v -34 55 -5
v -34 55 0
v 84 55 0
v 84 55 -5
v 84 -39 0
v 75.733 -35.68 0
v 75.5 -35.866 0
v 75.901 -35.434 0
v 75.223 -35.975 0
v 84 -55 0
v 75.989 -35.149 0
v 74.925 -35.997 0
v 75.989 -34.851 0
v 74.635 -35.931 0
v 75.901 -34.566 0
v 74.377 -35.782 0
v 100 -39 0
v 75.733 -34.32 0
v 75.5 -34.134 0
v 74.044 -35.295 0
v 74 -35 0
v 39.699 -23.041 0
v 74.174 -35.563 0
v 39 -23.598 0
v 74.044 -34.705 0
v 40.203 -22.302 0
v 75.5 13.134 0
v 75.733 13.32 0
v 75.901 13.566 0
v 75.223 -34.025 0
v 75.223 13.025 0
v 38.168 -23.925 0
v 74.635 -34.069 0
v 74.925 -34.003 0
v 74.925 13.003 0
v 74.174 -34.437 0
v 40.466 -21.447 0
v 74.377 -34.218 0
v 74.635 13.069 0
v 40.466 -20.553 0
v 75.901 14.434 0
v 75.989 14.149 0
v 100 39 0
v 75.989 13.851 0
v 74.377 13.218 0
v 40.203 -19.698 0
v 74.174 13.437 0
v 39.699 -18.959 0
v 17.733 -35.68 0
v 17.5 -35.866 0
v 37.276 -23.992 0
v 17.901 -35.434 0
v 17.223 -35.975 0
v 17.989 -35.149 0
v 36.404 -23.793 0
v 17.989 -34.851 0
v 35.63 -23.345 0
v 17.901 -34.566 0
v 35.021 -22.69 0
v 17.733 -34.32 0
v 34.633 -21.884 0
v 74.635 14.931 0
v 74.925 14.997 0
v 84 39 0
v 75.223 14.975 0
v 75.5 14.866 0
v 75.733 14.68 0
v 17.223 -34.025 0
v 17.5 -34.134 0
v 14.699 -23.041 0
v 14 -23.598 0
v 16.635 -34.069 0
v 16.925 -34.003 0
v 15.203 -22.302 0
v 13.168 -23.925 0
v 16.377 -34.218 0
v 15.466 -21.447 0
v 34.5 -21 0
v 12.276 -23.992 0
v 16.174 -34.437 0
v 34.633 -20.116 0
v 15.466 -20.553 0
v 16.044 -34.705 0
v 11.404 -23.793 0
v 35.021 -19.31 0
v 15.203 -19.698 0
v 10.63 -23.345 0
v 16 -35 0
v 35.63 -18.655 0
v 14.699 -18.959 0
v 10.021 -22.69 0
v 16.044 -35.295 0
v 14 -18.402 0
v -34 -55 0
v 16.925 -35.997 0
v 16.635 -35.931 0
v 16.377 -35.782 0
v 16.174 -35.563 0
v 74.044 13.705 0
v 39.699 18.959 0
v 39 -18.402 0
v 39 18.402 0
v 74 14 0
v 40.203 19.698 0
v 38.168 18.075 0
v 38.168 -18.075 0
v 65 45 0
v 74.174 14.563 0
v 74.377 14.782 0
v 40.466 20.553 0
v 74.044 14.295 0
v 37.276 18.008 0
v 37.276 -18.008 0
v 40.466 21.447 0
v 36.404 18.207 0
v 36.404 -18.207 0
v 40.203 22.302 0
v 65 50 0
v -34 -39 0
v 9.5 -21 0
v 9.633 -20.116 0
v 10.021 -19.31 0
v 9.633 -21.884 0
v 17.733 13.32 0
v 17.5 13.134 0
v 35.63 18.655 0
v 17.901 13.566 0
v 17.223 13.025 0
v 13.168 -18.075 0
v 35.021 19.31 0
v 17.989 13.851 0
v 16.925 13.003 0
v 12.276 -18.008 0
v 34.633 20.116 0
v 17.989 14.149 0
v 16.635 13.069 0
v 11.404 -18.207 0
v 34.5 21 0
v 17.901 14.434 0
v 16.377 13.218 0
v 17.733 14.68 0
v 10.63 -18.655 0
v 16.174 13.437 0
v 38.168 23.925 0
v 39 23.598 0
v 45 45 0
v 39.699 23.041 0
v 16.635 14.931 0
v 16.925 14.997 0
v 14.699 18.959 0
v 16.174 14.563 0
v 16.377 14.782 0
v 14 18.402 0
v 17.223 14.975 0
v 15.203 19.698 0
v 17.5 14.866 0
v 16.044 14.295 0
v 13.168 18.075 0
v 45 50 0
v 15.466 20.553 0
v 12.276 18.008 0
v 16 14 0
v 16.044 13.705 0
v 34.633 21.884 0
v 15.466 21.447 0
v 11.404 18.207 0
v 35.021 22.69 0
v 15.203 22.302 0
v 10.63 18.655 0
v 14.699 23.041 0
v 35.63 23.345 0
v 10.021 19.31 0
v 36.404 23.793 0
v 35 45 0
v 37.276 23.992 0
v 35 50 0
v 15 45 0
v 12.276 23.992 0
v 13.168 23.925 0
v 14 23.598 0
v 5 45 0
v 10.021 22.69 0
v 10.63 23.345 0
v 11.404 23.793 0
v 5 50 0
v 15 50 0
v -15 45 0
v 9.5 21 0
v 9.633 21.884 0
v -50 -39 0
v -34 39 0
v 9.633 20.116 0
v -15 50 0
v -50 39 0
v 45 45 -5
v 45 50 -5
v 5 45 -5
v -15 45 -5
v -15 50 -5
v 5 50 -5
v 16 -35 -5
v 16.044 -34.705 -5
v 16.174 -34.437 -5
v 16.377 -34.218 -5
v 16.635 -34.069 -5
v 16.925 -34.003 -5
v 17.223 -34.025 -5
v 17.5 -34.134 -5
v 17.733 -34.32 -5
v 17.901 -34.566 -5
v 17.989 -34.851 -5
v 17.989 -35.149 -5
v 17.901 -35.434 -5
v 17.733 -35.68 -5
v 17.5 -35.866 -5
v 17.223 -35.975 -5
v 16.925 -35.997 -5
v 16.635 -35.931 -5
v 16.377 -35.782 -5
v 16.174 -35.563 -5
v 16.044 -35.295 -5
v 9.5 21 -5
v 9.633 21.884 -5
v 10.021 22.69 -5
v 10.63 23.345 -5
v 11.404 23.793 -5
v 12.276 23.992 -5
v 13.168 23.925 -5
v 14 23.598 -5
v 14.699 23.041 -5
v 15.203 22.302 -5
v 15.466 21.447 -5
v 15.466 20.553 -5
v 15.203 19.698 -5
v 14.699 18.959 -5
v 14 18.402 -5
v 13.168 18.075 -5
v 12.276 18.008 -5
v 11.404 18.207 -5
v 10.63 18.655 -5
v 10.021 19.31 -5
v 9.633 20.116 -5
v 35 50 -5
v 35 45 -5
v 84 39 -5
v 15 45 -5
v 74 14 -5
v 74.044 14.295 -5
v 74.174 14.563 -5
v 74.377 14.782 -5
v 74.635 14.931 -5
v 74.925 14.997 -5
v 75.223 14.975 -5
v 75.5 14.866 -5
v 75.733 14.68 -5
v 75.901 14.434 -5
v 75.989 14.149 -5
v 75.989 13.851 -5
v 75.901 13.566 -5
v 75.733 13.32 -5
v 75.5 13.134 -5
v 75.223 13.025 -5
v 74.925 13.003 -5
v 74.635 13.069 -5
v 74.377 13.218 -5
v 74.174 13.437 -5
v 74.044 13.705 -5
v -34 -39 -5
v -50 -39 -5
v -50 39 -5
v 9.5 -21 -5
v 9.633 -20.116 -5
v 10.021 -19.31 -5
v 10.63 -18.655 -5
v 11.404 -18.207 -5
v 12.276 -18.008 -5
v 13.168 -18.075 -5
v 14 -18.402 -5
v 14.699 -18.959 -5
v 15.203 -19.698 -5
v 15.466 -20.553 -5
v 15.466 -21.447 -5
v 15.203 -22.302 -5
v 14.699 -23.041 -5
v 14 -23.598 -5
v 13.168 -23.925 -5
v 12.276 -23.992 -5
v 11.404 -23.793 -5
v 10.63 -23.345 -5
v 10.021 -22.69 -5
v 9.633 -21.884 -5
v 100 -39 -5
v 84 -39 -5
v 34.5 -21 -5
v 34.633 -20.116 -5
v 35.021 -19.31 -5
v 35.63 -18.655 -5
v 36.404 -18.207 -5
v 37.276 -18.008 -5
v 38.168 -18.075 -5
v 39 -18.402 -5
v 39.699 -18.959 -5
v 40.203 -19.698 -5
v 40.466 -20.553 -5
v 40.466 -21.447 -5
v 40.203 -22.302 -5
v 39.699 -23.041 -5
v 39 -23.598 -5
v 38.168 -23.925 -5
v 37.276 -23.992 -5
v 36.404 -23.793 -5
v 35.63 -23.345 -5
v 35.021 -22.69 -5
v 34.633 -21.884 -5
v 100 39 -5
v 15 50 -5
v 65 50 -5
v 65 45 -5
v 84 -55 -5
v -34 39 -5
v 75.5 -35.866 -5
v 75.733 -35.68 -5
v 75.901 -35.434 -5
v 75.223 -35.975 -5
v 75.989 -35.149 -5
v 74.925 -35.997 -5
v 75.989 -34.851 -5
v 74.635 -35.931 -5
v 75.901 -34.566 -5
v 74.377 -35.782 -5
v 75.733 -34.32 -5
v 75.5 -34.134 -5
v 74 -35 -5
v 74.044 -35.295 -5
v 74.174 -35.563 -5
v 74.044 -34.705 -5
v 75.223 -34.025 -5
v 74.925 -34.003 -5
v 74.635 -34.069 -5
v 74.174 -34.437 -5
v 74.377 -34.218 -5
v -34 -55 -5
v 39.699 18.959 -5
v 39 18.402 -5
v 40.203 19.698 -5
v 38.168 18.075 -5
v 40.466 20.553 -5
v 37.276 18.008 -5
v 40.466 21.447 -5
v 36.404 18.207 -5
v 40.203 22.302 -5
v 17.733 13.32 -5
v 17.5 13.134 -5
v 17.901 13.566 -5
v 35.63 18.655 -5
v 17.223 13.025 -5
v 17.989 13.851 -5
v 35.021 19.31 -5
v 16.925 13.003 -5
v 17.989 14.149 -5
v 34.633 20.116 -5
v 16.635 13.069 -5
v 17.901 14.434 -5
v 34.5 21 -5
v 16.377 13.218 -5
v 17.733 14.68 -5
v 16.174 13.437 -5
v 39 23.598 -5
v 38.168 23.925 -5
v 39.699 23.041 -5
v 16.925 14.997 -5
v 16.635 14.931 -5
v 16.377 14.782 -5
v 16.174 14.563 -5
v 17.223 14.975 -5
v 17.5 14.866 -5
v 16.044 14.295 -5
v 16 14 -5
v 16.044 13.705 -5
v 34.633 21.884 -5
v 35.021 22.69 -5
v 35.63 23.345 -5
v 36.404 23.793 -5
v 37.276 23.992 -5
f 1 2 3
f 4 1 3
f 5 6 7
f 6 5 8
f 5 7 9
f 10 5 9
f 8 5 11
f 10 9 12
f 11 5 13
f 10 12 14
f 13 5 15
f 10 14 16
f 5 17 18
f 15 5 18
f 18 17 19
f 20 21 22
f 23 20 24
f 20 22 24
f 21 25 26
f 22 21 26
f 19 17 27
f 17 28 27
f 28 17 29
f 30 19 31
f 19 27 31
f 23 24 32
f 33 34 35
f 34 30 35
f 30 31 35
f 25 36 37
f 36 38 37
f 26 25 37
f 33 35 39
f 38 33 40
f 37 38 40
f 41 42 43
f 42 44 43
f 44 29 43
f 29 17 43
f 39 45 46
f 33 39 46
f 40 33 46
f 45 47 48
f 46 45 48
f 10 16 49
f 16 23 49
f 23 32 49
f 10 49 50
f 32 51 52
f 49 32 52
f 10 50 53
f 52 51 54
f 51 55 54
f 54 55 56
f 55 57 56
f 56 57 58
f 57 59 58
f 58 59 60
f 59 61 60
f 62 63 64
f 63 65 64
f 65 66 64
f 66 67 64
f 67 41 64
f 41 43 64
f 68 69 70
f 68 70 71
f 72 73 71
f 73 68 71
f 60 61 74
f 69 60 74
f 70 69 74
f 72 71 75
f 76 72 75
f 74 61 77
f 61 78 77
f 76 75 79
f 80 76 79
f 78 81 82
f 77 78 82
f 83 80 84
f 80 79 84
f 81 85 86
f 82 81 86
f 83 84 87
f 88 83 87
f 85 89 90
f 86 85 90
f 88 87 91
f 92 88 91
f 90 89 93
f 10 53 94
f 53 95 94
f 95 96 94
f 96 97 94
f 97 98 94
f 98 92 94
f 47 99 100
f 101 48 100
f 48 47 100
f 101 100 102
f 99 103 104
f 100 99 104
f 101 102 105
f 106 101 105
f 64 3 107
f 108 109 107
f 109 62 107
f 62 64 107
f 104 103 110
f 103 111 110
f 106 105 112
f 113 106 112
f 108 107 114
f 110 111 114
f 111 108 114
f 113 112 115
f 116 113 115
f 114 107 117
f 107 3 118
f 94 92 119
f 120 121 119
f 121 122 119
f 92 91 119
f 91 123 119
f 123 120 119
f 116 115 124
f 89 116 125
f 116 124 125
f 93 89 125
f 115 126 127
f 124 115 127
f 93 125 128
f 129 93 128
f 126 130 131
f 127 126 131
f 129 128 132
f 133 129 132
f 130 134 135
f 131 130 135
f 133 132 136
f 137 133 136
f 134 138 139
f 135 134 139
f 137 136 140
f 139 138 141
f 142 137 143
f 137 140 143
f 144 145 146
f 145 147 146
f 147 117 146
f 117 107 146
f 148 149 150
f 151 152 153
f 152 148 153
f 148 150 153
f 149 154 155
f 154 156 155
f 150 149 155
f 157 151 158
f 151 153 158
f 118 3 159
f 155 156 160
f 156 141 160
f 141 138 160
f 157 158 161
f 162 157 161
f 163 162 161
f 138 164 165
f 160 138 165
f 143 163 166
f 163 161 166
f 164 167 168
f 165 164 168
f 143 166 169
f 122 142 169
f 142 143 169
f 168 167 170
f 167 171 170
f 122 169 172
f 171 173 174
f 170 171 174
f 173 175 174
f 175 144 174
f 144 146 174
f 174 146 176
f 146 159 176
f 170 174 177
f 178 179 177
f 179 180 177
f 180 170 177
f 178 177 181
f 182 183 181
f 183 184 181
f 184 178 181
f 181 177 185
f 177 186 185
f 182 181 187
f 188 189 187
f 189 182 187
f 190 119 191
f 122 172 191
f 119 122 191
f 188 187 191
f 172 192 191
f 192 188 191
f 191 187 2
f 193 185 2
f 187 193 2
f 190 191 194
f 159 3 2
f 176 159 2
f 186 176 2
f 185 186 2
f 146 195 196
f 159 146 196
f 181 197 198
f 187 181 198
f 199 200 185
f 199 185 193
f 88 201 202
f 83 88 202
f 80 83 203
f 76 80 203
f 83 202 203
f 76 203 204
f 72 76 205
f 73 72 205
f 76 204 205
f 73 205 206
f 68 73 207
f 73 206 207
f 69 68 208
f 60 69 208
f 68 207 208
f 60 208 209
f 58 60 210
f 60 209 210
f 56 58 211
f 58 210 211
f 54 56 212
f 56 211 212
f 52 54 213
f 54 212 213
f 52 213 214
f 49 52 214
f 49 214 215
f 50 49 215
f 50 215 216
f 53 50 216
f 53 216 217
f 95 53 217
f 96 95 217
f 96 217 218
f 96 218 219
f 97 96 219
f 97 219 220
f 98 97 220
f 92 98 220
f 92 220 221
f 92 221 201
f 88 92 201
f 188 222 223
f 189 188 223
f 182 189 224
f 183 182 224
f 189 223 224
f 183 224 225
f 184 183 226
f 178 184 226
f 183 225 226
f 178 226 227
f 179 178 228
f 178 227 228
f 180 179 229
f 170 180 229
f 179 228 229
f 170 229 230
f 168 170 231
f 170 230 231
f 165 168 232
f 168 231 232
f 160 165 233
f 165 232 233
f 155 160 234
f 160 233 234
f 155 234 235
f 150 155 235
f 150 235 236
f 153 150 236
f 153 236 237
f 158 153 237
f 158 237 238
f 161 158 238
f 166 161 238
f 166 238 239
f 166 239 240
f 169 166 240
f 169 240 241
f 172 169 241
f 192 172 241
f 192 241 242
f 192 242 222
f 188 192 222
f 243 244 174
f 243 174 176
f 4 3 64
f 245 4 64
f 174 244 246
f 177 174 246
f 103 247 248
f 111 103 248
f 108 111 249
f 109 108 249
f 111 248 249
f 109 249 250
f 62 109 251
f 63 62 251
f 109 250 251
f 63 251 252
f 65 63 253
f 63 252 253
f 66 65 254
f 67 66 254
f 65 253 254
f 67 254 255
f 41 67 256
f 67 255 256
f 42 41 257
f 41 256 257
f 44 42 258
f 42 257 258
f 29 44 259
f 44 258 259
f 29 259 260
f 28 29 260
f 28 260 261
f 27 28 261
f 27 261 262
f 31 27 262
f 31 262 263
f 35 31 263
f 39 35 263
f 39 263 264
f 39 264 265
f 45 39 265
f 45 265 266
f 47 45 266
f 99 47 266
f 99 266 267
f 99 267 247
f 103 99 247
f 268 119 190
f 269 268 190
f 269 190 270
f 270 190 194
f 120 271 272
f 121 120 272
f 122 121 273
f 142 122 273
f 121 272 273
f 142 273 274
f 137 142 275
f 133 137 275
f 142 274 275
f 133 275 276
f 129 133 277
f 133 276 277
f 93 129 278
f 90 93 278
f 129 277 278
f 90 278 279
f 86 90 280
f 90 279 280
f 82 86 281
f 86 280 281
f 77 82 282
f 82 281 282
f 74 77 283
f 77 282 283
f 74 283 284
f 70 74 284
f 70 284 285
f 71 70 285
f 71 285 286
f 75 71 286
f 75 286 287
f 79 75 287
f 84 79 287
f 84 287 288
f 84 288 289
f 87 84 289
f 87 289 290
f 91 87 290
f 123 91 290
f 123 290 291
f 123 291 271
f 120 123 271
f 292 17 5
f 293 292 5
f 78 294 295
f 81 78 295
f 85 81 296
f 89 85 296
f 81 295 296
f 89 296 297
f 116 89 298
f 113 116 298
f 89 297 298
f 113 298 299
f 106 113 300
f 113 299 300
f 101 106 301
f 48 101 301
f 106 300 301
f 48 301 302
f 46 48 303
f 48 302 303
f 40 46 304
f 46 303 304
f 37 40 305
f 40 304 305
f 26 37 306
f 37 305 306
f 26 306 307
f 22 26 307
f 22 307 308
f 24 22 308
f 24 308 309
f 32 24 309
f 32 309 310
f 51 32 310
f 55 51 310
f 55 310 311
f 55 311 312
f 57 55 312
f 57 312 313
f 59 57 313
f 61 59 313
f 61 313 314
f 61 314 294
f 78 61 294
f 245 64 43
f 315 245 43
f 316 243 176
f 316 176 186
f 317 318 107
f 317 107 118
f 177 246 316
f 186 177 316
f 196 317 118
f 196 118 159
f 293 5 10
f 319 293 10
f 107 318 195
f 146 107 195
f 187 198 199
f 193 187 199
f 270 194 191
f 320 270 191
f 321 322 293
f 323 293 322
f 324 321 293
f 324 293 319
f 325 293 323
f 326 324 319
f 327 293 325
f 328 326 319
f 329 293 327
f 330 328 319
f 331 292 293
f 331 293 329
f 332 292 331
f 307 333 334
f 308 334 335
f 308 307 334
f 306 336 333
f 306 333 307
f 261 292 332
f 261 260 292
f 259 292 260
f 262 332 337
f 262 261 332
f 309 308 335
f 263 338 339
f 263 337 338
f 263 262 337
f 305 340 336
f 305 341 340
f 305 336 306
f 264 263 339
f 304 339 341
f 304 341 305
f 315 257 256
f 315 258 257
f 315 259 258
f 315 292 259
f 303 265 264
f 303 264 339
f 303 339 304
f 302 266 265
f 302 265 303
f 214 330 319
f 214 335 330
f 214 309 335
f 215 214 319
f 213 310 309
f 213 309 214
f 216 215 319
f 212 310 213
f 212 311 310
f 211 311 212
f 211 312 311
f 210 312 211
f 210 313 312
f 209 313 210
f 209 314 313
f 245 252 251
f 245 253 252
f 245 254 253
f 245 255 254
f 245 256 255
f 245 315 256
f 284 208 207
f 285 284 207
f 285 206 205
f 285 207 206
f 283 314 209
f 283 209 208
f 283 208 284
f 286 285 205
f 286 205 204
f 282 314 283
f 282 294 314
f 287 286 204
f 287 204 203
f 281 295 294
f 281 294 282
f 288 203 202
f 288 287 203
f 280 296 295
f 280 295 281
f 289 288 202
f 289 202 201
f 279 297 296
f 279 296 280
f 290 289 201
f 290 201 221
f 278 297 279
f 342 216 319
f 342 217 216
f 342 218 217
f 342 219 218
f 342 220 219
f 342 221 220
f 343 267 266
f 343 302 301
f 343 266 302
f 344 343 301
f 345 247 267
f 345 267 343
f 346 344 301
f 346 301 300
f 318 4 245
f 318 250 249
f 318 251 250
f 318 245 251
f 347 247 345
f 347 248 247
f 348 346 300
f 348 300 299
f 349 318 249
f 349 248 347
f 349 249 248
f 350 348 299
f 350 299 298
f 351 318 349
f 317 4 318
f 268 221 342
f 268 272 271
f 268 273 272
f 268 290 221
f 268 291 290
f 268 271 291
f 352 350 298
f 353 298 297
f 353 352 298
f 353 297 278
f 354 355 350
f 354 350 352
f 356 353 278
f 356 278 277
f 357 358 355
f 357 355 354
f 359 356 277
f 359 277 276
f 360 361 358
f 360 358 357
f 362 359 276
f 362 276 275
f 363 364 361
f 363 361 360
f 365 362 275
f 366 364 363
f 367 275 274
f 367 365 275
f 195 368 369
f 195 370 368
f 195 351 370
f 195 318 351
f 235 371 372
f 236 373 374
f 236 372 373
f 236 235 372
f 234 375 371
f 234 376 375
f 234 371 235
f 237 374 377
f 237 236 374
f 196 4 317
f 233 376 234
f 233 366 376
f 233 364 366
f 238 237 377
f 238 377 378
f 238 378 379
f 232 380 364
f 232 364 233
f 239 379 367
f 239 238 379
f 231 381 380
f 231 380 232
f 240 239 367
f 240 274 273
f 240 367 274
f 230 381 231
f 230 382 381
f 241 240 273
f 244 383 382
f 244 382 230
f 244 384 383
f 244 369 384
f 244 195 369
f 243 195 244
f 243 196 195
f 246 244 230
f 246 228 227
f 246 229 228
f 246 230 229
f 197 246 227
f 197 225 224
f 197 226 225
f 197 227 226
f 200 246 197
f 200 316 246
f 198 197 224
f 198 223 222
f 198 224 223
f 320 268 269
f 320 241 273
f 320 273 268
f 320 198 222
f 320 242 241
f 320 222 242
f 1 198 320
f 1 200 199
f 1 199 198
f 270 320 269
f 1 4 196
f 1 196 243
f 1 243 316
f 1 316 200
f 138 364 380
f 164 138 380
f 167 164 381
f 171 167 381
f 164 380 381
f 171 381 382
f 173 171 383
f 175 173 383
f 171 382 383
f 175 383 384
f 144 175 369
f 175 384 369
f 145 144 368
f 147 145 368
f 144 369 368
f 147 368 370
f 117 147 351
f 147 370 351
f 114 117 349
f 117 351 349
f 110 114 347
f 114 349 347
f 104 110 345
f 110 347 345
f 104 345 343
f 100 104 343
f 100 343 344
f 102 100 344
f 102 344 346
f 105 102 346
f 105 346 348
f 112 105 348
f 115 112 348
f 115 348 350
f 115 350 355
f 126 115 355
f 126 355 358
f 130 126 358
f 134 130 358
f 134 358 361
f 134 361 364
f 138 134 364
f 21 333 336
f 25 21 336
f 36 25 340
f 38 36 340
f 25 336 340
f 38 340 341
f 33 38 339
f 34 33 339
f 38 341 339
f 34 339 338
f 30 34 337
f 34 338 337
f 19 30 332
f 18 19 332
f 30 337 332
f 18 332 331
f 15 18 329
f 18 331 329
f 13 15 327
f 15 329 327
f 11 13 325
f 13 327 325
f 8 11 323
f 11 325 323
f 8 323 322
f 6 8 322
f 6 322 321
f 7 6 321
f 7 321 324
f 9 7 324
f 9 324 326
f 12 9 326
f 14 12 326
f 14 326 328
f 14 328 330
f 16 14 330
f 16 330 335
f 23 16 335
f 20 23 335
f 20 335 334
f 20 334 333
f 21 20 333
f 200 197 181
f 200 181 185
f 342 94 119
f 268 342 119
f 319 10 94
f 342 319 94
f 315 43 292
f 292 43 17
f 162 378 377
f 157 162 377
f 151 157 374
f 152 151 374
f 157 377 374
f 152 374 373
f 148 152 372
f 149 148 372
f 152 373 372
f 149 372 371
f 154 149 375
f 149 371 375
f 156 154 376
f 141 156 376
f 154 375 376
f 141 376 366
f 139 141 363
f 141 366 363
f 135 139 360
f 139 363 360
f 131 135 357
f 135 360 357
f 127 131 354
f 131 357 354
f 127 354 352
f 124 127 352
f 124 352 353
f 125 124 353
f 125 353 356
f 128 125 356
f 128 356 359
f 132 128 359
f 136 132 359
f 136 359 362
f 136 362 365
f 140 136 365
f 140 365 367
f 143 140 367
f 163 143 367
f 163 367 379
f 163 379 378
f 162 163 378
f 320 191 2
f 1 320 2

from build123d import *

# Parameters (mm, degrees)
BOSS_EXTRU_1_DEPTH      = 5
ESQUISSE2_R             = 1
ENL_V_MAT_EXTRU_1_DEPTH = 115.236596588
ESQUISSE3_R             = 3
ENL_V_MAT_EXTRU_2_DEPTH = 115.236596588
ESQUISSE4_W             = 20
ESQUISSE4_H             = 5
ENL_V_MAT_EXTRU_3_DEPTH = 115.236596588


with BuildPart() as part:
    # Esquisse1 → Boss.-Extru.1 (new body)
    with BuildSketch(Plane.XY):
        Polygon((-34, 55), (84, 55), (84, 39), (100, 39), (100, -39), (84, -39), (84, -55), (-34, -55), (-34, -39), (-50, -39), (-50, 39), (-34, 39), align=None)
    extrude(amount=-BOSS_EXTRU_1_DEPTH)

    # Esquisse2 → Enlèv. mat.-Extru.1 (cut, through all)
    with BuildSketch(Plane(origin=(0, 0, -5), x_dir=(-1, 0, 0), z_dir=(0, 0, -1))):
        with Locations((-75, -35)):
            Circle(ESQUISSE2_R)
        with Locations((-17, -35)):
            Circle(ESQUISSE2_R)
        with Locations((-75, 14)):
            Circle(ESQUISSE2_R)
        with Locations((-17, 14)):
            Circle(ESQUISSE2_R)
    extrude(amount=-ENL_V_MAT_EXTRU_1_DEPTH, mode=Mode.SUBTRACT)

    # Esquisse3 → Enlèv. mat.-Extru.2 (cut, through all)
    with BuildSketch(Plane(origin=(0, 0, -5), x_dir=(-1, 0, 0), z_dir=(0, 0, -1))):
        with Locations((-37.5, -21)):
            Circle(ESQUISSE3_R)
        with Locations((-37.5, 21)):
            Circle(ESQUISSE3_R)
        with Locations((-12.5, 21)):
            Circle(ESQUISSE3_R)
        with Locations((-12.5, -21)):
            Circle(ESQUISSE3_R)
    extrude(amount=-ENL_V_MAT_EXTRU_2_DEPTH, mode=Mode.SUBTRACT)

    # Esquisse4 → Enlèv. mat.-Extru.3 (cut, through all)
    with BuildSketch(Plane(origin=(0, 0, -5), x_dir=(-1, 0, 0), z_dir=(0, 0, -1))):
        with Locations((-55, 47.5)):
            Rectangle(ESQUISSE4_W, ESQUISSE4_H)
        with Locations((-25, 47.5)):
            Rectangle(ESQUISSE4_W, ESQUISSE4_H)
        with Locations((5, 47.5)):
            Rectangle(ESQUISSE4_W, ESQUISSE4_H)
    extrude(amount=-ENL_V_MAT_EXTRU_3_DEPTH, mode=Mode.SUBTRACT)


solid = part.part
